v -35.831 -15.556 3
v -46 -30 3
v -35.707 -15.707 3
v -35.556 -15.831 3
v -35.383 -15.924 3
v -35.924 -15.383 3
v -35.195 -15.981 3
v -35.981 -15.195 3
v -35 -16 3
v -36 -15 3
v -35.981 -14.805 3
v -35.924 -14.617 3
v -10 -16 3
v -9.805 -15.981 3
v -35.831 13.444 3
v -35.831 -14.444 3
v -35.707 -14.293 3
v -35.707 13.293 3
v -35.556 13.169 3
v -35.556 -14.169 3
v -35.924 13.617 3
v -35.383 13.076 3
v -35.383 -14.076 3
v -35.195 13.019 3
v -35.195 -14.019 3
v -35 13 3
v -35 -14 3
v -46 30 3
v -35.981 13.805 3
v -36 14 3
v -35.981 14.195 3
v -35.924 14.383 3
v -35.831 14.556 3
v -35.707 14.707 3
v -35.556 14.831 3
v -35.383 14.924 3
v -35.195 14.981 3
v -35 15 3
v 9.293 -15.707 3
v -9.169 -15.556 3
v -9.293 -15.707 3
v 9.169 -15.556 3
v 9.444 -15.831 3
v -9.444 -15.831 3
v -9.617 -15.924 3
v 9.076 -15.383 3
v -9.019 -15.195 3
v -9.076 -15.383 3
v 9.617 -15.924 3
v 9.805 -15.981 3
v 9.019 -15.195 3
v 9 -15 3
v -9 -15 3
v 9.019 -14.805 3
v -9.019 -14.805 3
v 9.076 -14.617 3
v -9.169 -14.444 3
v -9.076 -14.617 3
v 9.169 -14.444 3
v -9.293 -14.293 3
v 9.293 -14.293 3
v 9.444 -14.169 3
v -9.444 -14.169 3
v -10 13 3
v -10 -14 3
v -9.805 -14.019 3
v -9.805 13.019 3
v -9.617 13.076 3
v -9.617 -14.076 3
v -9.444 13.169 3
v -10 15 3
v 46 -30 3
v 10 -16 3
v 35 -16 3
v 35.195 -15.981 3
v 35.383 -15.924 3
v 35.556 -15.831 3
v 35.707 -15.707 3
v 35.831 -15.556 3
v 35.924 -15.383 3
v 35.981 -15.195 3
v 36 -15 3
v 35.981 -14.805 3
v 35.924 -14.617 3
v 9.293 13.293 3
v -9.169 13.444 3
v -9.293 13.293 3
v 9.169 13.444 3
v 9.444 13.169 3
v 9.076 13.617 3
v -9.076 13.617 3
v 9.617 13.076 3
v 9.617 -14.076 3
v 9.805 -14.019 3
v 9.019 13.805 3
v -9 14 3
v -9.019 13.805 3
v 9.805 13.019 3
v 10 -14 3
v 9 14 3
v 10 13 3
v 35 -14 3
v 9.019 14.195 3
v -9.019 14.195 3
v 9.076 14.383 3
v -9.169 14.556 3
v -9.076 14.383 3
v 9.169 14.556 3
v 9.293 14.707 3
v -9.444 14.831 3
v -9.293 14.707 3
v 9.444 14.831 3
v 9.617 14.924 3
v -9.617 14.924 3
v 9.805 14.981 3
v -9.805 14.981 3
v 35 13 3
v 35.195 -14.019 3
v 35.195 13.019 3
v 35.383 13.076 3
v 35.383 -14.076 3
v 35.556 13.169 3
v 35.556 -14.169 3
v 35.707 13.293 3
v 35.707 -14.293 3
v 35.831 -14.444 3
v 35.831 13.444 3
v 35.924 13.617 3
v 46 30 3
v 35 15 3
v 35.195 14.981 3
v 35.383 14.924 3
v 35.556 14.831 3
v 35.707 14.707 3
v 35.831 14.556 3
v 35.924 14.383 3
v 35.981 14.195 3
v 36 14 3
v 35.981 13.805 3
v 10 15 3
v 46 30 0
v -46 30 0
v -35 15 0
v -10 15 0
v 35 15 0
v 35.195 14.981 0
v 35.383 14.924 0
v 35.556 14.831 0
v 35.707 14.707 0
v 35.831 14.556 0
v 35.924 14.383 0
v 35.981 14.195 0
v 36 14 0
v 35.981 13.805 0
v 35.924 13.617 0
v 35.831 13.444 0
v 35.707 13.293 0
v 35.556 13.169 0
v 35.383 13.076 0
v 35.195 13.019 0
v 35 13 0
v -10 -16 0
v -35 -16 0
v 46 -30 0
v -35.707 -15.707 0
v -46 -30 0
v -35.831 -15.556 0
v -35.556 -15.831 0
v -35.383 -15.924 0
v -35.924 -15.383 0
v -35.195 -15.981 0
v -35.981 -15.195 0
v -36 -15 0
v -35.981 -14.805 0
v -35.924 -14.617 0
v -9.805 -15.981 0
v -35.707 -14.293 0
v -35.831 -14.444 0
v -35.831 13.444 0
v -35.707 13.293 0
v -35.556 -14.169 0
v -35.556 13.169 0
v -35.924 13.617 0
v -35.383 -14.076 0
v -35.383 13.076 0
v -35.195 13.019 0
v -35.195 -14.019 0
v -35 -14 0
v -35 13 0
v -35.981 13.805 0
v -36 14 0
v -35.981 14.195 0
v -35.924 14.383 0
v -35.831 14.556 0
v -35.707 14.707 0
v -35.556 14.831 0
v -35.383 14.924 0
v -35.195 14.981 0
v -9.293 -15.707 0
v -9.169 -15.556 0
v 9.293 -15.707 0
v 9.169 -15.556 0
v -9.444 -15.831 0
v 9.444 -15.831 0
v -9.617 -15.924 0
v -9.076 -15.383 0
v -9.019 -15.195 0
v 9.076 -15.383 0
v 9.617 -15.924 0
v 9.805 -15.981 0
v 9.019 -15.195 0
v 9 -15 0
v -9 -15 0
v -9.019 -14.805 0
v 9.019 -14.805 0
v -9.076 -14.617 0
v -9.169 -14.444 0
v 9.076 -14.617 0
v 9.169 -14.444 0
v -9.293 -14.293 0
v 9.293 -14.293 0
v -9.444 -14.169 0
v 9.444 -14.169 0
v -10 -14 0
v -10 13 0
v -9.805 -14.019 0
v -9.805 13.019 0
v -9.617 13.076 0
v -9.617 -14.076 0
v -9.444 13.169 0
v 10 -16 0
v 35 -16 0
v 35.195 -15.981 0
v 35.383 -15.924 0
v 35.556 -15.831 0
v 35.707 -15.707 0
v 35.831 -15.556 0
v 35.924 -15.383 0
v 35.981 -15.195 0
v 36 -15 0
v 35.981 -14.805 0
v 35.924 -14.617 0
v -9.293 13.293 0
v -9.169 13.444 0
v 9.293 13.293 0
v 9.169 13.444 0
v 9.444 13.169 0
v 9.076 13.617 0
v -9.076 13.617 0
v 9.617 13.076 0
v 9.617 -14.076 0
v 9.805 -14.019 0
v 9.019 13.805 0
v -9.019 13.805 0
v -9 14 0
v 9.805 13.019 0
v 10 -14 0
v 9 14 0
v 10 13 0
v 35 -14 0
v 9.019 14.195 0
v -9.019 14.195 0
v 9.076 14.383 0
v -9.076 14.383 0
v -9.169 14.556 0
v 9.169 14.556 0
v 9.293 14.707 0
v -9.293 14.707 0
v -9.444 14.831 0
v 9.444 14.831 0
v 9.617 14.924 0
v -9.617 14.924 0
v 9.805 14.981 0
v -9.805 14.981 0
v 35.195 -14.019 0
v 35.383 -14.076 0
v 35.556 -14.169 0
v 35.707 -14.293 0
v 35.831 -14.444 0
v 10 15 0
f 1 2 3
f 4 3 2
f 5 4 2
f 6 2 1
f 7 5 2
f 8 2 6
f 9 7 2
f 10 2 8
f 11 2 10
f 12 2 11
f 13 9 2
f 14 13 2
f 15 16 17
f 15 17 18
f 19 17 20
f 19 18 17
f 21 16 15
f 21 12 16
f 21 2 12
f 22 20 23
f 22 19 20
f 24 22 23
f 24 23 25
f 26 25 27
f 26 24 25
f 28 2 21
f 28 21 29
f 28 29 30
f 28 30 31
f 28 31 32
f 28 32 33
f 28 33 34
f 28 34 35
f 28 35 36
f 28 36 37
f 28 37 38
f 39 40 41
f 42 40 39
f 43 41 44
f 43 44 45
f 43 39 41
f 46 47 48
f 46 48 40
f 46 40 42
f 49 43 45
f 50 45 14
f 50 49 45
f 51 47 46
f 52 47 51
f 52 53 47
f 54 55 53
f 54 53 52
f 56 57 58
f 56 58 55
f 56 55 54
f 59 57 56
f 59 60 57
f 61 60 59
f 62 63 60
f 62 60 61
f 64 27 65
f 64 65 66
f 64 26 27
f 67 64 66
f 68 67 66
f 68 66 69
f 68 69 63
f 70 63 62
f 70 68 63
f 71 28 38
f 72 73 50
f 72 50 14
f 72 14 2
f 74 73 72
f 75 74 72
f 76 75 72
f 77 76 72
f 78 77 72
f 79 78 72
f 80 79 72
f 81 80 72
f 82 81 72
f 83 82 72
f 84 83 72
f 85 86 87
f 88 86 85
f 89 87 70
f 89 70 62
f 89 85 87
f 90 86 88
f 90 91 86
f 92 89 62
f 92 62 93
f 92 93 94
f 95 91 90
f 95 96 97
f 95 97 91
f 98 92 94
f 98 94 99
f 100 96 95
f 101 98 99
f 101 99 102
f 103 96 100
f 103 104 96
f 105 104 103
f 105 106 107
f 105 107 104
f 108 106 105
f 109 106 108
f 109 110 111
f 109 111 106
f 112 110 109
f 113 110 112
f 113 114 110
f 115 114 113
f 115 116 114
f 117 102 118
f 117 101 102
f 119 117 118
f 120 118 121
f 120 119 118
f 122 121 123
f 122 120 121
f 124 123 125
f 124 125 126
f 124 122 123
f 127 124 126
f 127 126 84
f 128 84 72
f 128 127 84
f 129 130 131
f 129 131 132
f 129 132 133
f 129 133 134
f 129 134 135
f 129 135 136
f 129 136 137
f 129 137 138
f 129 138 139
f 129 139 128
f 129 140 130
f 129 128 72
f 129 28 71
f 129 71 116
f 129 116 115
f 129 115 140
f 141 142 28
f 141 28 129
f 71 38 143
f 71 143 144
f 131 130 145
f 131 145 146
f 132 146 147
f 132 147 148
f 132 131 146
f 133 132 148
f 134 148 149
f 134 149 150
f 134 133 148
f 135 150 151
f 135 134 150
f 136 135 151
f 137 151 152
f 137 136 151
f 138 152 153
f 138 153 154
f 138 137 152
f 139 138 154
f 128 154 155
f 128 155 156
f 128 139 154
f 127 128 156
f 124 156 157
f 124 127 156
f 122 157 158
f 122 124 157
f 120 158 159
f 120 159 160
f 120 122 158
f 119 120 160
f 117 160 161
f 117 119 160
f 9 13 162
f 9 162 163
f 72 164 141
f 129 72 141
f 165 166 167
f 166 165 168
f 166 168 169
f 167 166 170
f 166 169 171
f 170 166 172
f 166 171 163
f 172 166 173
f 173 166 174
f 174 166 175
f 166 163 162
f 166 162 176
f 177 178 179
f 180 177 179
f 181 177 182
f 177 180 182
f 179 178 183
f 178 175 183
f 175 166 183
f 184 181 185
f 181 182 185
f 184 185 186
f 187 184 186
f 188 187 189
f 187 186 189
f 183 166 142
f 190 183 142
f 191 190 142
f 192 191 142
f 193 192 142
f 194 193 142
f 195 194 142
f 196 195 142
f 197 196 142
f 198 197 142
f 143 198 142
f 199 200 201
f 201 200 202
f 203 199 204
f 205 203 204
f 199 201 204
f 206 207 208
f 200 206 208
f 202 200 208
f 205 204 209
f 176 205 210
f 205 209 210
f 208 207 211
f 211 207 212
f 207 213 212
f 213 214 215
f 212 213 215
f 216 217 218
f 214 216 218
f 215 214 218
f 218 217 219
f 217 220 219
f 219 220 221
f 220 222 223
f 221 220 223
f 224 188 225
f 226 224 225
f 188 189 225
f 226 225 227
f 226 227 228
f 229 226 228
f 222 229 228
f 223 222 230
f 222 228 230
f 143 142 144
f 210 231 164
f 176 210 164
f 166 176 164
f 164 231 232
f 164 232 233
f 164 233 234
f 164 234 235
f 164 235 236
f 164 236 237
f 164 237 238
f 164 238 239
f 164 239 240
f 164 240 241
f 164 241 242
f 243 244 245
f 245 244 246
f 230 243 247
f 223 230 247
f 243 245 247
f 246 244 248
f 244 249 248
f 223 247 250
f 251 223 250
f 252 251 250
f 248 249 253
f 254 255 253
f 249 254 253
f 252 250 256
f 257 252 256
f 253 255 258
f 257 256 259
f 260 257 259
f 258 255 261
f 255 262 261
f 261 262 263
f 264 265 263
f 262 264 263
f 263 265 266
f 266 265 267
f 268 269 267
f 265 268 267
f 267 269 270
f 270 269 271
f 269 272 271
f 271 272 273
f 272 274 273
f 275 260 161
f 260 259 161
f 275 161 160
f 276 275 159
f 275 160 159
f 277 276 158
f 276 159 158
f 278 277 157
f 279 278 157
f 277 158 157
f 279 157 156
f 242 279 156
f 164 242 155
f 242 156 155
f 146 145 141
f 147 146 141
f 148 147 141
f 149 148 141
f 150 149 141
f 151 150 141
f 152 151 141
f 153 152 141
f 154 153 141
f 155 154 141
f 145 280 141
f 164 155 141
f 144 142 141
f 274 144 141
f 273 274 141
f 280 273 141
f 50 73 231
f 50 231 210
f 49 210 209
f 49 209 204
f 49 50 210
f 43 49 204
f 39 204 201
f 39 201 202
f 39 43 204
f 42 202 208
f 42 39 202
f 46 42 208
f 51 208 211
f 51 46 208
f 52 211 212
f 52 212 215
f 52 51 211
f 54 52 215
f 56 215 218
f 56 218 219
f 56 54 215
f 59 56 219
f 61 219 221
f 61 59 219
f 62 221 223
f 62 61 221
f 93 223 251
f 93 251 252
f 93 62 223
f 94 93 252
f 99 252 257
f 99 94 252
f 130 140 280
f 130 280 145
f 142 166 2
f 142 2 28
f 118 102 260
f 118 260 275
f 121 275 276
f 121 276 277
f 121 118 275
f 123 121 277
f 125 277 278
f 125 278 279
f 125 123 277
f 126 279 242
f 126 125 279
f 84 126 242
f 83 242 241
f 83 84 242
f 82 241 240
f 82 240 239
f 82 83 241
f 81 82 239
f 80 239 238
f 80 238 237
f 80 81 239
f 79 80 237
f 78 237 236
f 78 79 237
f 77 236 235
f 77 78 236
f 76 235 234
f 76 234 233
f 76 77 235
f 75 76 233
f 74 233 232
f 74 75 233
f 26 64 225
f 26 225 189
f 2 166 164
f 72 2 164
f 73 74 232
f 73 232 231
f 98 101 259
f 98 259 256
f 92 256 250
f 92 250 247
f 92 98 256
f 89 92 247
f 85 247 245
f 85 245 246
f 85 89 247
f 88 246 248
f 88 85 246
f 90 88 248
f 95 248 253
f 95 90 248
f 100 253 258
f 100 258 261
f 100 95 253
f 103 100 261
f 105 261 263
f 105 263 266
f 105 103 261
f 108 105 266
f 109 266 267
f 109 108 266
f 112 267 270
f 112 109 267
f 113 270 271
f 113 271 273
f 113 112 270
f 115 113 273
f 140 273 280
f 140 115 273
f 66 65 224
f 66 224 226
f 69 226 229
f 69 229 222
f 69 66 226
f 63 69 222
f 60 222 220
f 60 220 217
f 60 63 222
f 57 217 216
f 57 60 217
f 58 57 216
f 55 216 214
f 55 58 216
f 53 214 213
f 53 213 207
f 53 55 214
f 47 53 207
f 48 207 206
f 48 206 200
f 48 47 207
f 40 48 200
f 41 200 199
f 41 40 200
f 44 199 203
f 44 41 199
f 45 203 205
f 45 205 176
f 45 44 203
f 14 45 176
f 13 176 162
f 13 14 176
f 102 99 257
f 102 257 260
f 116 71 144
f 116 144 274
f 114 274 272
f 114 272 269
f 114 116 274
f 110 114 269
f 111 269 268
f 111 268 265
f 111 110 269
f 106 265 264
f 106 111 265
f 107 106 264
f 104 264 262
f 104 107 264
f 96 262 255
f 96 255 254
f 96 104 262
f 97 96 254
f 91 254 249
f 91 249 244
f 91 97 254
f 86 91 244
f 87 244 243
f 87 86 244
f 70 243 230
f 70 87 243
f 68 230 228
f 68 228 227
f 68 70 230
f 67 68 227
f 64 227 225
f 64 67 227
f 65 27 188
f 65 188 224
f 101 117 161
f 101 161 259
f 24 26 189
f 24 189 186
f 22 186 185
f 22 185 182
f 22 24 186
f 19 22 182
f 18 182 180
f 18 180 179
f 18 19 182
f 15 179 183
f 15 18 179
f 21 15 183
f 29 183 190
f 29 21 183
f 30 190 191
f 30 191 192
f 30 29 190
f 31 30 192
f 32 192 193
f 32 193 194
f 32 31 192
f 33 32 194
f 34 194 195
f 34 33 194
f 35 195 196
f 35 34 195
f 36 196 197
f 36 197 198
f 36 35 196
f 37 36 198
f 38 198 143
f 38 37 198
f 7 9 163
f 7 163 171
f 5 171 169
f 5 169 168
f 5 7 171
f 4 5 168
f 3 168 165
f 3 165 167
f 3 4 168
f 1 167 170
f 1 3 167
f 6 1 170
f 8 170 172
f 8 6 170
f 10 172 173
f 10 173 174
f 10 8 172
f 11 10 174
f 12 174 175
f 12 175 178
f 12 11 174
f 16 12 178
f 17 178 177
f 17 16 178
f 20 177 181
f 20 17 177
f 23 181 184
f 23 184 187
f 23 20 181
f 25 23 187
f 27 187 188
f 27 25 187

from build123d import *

# Parameters (mm, degrees)
SKETCH1_W           = 92
SKETCH1_H           = 60
BOSS_EXTRUDE1_DEPTH = 3
CUT_EXTRUDE1_DEPTH  = 3


with BuildPart() as part:
    # Sketch1 → Boss-Extrude1 (new body)
    with BuildSketch(Plane.XY):
        Rectangle(SKETCH1_W, SKETCH1_H)
    extrude(amount=BOSS_EXTRUDE1_DEPTH)

    # Sketch2 → Cut-Extrude1 (cut)
    with BuildSketch(Plane.XY.offset(3)):
        with BuildLine():
            Line((-35, 15), (-10, 15))
            ThreePointArc((-10, 15), (-9, 14), (-10, 13))
            Line((-10, 13), (-35, 13))
            ThreePointArc((-35, 13), (-36, 14), (-35, 15))
        make_face()
        with BuildLine():
            Line((-35, -14), (-10, -14))
            ThreePointArc((-10, -14), (-9, -15), (-10, -16))
            Line((-10, -16), (-35, -16))
            ThreePointArc((-35, -16), (-36, -15), (-35, -14))
        make_face()
        with BuildLine():
            Line((35, 13), (10, 13))
            ThreePointArc((10, 13), (9, 14), (10, 15))
            Line((10, 15), (35, 15))
            ThreePointArc((35, 15), (36, 14), (35, 13))
        make_face()
        with BuildLine():
            Line((35, -16), (10, -16))
            ThreePointArc((10, -16), (9, -15), (10, -14))
            Line((10, -14), (35, -14))
            ThreePointArc((35, -14), (36, -15), (35, -16))
        make_face()
    extrude(amount=-CUT_EXTRUDE1_DEPTH, mode=Mode.SUBTRACT)


solid = part.part
